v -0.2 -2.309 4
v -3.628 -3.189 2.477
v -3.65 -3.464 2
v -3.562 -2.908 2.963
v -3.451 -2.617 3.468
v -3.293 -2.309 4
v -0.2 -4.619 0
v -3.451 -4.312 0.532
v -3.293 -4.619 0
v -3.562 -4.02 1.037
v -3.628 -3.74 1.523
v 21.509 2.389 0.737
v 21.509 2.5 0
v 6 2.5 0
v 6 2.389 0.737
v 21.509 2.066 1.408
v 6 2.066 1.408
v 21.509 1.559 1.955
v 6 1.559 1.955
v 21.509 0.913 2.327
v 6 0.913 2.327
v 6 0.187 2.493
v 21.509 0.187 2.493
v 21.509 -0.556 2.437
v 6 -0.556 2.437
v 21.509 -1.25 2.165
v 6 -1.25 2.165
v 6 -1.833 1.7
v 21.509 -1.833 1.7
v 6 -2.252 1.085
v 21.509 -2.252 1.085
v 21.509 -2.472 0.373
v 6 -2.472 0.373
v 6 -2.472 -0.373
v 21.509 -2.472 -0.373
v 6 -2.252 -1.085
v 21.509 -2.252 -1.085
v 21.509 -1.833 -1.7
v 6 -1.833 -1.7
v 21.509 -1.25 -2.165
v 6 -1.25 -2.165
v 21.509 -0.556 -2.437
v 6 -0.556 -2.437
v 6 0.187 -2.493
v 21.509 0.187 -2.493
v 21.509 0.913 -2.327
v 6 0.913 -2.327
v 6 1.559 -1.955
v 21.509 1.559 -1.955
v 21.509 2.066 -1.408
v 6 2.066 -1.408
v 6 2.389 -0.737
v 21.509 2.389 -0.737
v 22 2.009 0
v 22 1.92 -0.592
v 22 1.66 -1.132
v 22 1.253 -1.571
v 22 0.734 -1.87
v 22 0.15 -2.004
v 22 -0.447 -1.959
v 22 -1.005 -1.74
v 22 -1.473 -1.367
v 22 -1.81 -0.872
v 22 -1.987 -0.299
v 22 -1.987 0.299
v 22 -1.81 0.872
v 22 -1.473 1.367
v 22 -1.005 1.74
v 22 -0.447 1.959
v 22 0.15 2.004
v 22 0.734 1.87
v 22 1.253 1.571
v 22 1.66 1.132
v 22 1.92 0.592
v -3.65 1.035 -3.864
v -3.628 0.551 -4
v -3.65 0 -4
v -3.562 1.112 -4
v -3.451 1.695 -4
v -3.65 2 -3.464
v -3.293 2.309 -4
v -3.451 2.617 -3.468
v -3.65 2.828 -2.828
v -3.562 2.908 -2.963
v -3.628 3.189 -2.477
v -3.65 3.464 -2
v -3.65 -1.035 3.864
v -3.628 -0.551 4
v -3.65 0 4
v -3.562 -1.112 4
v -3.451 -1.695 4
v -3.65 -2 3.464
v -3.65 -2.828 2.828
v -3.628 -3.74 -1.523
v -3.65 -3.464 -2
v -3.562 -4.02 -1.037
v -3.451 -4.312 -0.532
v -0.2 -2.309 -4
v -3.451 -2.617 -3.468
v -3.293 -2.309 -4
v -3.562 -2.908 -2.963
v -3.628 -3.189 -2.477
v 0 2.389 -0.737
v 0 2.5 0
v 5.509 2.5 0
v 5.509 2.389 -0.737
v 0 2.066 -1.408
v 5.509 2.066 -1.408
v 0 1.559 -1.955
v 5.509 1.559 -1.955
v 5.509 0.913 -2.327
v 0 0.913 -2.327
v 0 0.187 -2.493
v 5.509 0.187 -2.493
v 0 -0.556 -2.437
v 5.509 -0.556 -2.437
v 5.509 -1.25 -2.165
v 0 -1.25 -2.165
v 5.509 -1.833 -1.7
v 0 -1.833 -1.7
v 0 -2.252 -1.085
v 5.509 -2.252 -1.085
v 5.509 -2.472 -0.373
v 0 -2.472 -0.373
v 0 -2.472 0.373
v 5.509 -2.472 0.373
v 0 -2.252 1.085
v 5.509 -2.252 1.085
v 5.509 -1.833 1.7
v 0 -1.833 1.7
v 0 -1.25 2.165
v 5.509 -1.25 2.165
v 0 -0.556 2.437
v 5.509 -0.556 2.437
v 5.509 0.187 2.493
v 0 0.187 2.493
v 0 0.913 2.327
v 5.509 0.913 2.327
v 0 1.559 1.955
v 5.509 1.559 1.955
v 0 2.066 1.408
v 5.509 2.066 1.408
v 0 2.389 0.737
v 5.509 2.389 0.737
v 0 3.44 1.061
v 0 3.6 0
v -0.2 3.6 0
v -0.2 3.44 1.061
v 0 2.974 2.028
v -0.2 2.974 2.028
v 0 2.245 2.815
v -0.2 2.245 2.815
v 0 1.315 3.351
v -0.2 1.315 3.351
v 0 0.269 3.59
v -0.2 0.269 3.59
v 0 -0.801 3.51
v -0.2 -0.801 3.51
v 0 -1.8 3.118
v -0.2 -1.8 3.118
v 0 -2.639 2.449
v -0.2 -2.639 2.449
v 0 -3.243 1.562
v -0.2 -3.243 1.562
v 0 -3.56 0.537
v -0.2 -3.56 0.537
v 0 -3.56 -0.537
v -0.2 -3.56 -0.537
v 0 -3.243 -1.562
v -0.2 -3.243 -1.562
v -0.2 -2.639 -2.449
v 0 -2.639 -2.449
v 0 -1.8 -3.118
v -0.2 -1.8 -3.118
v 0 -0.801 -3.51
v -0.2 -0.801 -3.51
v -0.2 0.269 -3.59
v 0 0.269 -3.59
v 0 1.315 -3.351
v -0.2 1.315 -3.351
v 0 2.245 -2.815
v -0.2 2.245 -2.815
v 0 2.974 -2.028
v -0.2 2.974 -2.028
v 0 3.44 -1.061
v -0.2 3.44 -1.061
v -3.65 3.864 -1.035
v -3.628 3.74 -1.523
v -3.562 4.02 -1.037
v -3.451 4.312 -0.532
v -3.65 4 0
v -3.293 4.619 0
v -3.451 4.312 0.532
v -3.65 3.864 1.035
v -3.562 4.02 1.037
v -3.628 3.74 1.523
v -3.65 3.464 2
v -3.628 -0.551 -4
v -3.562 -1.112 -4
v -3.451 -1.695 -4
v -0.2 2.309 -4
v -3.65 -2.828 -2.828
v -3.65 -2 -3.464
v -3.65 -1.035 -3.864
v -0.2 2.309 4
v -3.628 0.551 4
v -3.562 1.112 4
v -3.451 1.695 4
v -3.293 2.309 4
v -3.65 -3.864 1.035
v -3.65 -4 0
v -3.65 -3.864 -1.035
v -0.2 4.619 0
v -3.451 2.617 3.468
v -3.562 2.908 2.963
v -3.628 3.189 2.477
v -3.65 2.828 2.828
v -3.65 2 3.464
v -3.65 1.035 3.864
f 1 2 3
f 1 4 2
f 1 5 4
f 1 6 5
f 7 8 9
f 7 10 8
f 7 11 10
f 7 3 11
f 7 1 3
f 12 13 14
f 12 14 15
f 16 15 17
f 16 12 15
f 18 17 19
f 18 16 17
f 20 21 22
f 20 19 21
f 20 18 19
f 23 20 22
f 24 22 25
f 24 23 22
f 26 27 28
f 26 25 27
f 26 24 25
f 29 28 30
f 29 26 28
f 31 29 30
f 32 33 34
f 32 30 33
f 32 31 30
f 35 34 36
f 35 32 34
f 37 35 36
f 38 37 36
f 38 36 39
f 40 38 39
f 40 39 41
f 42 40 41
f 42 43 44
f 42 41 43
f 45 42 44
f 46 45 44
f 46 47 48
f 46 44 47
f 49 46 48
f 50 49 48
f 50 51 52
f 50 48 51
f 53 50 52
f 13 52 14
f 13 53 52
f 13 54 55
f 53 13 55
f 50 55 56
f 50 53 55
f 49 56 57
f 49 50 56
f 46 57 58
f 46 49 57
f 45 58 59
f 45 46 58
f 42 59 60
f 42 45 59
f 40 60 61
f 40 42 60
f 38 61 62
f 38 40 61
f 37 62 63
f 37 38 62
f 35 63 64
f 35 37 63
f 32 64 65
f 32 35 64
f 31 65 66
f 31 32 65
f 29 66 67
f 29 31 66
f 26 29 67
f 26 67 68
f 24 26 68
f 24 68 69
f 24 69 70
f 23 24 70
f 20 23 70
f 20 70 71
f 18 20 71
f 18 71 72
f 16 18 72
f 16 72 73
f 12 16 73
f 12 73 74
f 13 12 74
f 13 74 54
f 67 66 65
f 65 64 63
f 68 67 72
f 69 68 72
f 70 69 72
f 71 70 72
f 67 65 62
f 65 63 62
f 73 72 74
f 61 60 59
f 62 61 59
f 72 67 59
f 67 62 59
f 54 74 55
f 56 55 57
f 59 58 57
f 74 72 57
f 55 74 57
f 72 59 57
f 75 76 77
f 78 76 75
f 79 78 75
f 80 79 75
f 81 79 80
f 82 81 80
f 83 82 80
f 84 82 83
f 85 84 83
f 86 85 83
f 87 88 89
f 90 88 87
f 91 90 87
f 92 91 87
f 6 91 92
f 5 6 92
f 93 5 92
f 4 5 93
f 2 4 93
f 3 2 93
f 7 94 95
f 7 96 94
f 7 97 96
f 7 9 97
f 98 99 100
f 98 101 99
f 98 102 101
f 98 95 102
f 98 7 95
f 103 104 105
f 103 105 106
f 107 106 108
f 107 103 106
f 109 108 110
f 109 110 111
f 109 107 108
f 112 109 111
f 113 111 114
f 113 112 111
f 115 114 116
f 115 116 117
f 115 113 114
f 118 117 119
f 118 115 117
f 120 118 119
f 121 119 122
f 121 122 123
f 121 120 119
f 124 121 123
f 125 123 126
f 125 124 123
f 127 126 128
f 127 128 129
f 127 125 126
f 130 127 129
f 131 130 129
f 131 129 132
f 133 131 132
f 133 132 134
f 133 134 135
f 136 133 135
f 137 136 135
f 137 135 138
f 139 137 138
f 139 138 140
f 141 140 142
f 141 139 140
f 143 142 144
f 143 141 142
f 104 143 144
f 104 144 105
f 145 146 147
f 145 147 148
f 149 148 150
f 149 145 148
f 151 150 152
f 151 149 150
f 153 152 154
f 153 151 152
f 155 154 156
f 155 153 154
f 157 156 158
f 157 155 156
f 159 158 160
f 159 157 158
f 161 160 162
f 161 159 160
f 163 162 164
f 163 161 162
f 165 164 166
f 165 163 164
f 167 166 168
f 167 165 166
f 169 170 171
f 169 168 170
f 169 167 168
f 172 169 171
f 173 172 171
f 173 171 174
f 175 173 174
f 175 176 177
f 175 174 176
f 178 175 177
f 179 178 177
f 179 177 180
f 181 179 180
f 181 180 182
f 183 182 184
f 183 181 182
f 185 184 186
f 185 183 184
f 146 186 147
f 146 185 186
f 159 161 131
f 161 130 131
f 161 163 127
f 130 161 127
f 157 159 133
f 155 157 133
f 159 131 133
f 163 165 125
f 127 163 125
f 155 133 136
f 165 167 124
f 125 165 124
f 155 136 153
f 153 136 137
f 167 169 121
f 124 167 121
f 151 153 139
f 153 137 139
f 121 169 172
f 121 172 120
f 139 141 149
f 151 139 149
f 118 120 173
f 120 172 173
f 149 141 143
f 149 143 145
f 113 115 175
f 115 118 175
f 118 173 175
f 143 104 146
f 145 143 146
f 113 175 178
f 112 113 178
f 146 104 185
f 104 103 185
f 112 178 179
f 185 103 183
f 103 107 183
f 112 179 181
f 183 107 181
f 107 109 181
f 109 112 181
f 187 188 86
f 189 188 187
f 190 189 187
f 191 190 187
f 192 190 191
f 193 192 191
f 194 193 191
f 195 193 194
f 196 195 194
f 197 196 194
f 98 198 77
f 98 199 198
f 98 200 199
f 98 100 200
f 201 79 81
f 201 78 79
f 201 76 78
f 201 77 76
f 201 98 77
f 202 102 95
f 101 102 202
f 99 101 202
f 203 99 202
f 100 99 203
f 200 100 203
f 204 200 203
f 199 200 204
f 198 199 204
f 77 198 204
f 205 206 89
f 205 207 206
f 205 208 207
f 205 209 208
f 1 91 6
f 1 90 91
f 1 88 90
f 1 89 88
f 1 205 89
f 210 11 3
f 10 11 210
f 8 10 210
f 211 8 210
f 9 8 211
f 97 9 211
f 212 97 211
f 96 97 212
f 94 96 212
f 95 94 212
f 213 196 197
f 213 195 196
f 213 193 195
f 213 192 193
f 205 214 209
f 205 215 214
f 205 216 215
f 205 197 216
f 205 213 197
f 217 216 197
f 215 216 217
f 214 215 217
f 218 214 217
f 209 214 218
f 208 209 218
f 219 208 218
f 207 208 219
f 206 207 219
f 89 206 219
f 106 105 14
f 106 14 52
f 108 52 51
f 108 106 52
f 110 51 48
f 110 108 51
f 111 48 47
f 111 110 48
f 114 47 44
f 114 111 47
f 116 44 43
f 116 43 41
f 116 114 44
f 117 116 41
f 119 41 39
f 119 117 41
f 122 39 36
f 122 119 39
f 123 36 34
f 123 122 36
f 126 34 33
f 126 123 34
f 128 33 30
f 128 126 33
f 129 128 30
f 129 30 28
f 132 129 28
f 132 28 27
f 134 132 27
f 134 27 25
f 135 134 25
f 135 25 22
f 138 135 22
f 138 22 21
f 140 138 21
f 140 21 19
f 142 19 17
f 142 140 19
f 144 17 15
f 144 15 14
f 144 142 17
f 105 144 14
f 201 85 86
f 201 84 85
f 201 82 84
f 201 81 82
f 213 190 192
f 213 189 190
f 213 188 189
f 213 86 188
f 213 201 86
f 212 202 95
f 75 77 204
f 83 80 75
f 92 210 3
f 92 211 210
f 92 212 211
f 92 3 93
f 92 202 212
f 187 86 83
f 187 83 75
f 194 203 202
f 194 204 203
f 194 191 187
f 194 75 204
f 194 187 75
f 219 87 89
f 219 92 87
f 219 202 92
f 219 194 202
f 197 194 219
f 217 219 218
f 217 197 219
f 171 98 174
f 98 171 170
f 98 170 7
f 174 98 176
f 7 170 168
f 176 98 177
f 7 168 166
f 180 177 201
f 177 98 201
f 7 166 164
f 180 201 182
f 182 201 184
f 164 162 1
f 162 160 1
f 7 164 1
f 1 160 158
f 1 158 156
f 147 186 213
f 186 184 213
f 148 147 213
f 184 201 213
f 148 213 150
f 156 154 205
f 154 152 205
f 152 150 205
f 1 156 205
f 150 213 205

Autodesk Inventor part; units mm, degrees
ref_plane "YZ Plane" through (0, 0, 0) normal (1, 0, 0) x (0, 1, 0)
ref_plane "XZ Plane" through (0, 0, 0) normal (0, 1, 0) x (-1, 0, 0)
sketch "Szkic1" plane through (0, 0, 0) normal (0, 0, 1) x (1, 0, 0)
  line L0 (0, 3.6) -> (0, 2.5)
  line L1 (6, 2.5) -> (22, 2.5)
  line L2 (22, 2.5) -> (22, 0)
  line L3 (22, 0) -> (-0.2001, 0)
  line L4 (-4.6401, 0) -> (26.44, 0) projected
  line L5 (-0.2001, 0) -> (-0.2001, 3.6)
  line L6 (-0.2001, 3.6) -> (0, 3.6)
  line L7 (6, 2.5) -> (5.5091, 2.5)
  line L8 (5.5091, 2.5) -> (0, 2.5)
  line L9 (0, -0.72) -> (0, 4.32) projected
  dimension "d0" = 22
  dimension "d1" = 16
  dimension "d2" = 5
  dimension "d9" = 0.2001
  dimension "d10" = 7.2
  dimension "d13" = 0.4909
  dimension "d14" = 5
revolve "Bryła" add sketch "Szkic1" angle 360 about axis through (22, 0, 0) along (-1, 0, 0)
sketch "Szkic2" plane through (-0.2001, 0, 0) normal (-1, 0, 0) x (0, 0, 1)
  line L0 (0, 4.6188) -> (4, 2.3094)
  line L1 (4, 2.3094) -> (4, -2.3094)
  line L2 (4, -2.3094) -> (0, -4.6188)
  line L3 (0, -4.6188) -> (-4, -2.3094)
  line L4 (-4, -2.3094) -> (-4, 2.3094)
  line L5 (-4, 2.3094) -> (0, 4.6188)
  point P0 (0, 0)
  point P1 (0, 0)
  dimension "d11" = 8
extrude "Głowica" add sketch "Szkic2" along normal blind 3.45
sketch "Szkic4" plane through (0, 0, 0) normal (0, 0, 1) x (1, 0, 0)
  line L0 (-3.6501, 4) -> (-3.6501, 4.6188)
  line L1 (-3.6501, 4.6188) -> (-3.2928, 4.6188)
  line L2 (-3.2928, 4.6188) -> (-3.6501, 4)
  line L3 (-4.3401, 0) -> (0.4899, 0) projected
  line L4 (-0.2001, 4.6188) -> (-3.6501, 4.6188) projected
  line L5 (-3.6501, 2.3094) -> (-3.6501, 4.6188) projected
  dimension "d5" = 30
  dimension "d19" = 8
revolve "Faza1" cut sketch "Szkic4" angle 360 about axis through (-10, 0, 0) along (1, 0, 0)
thread "Gwint" size "M5x0.8" class "6g" standard "ISO Metric profile" length 16
chamfer "Faza2" distance 0.4908 distance2 0.4909 1 edges at (22, -2.5, 0) measured on face at (22, -0.7192, -0.1653)
ref_plane "Work Plane1" through (1.525, 0, 0) normal (0, 0, 1) x (1, 0, 0)
equation "\"d0\" = NLG"
equation "\"d1\" = GEL"
equation "\"d2\" = GD"
equation "\"d10\" = SD2"
equation "\"d14\" = BDM"
equation "\"d11\" = SW"
equation "\"d3\" = KOH - SD"
equation "\"d5\" = ANG1"
equation "\"d19\" = SW0"
equation "\"d15\" = GEL"
equation "\"d6\" = -0.5 * SPD + 0.5 * GD"
equation "\"NLG\" = 22"
equation "\"GD\" = NND"
equation "\"BDM\" = NND"
equation "\"KOH\" = 3.65"
equation "\"GEL\" = 16"
equation "\"SW\" = 8"
equation "\"SW0\" = 8"
equation "\"SPD\" = NND - 1.2269 * PTC"
equation "\"SD2\" = 0.9 * SW"
equation "\"SD\" = 0.2"
equation "\"ANG1\" = 30deg"
equation "\"GAL\" = 0.61345 * PTC"
equation "\"GUL\" = 0.61345 * PTC"
equation "\"RR\" = 0.35"
equation "\"GD1\" = THREADDIA - 1.2269 * PTC"
equation "\"THREADDIA\" = 5"
equation "\"SDH\" = 7.55"
equation "\"TOA\" = 30deg"
equation "\"PTC\" = 0.8"
equation "\"NND\" = 5"
equation "\"E0\" = 1.155 * SW"
properties part number "BS 3692 - M5 x 22" material "Stal, miękka"
